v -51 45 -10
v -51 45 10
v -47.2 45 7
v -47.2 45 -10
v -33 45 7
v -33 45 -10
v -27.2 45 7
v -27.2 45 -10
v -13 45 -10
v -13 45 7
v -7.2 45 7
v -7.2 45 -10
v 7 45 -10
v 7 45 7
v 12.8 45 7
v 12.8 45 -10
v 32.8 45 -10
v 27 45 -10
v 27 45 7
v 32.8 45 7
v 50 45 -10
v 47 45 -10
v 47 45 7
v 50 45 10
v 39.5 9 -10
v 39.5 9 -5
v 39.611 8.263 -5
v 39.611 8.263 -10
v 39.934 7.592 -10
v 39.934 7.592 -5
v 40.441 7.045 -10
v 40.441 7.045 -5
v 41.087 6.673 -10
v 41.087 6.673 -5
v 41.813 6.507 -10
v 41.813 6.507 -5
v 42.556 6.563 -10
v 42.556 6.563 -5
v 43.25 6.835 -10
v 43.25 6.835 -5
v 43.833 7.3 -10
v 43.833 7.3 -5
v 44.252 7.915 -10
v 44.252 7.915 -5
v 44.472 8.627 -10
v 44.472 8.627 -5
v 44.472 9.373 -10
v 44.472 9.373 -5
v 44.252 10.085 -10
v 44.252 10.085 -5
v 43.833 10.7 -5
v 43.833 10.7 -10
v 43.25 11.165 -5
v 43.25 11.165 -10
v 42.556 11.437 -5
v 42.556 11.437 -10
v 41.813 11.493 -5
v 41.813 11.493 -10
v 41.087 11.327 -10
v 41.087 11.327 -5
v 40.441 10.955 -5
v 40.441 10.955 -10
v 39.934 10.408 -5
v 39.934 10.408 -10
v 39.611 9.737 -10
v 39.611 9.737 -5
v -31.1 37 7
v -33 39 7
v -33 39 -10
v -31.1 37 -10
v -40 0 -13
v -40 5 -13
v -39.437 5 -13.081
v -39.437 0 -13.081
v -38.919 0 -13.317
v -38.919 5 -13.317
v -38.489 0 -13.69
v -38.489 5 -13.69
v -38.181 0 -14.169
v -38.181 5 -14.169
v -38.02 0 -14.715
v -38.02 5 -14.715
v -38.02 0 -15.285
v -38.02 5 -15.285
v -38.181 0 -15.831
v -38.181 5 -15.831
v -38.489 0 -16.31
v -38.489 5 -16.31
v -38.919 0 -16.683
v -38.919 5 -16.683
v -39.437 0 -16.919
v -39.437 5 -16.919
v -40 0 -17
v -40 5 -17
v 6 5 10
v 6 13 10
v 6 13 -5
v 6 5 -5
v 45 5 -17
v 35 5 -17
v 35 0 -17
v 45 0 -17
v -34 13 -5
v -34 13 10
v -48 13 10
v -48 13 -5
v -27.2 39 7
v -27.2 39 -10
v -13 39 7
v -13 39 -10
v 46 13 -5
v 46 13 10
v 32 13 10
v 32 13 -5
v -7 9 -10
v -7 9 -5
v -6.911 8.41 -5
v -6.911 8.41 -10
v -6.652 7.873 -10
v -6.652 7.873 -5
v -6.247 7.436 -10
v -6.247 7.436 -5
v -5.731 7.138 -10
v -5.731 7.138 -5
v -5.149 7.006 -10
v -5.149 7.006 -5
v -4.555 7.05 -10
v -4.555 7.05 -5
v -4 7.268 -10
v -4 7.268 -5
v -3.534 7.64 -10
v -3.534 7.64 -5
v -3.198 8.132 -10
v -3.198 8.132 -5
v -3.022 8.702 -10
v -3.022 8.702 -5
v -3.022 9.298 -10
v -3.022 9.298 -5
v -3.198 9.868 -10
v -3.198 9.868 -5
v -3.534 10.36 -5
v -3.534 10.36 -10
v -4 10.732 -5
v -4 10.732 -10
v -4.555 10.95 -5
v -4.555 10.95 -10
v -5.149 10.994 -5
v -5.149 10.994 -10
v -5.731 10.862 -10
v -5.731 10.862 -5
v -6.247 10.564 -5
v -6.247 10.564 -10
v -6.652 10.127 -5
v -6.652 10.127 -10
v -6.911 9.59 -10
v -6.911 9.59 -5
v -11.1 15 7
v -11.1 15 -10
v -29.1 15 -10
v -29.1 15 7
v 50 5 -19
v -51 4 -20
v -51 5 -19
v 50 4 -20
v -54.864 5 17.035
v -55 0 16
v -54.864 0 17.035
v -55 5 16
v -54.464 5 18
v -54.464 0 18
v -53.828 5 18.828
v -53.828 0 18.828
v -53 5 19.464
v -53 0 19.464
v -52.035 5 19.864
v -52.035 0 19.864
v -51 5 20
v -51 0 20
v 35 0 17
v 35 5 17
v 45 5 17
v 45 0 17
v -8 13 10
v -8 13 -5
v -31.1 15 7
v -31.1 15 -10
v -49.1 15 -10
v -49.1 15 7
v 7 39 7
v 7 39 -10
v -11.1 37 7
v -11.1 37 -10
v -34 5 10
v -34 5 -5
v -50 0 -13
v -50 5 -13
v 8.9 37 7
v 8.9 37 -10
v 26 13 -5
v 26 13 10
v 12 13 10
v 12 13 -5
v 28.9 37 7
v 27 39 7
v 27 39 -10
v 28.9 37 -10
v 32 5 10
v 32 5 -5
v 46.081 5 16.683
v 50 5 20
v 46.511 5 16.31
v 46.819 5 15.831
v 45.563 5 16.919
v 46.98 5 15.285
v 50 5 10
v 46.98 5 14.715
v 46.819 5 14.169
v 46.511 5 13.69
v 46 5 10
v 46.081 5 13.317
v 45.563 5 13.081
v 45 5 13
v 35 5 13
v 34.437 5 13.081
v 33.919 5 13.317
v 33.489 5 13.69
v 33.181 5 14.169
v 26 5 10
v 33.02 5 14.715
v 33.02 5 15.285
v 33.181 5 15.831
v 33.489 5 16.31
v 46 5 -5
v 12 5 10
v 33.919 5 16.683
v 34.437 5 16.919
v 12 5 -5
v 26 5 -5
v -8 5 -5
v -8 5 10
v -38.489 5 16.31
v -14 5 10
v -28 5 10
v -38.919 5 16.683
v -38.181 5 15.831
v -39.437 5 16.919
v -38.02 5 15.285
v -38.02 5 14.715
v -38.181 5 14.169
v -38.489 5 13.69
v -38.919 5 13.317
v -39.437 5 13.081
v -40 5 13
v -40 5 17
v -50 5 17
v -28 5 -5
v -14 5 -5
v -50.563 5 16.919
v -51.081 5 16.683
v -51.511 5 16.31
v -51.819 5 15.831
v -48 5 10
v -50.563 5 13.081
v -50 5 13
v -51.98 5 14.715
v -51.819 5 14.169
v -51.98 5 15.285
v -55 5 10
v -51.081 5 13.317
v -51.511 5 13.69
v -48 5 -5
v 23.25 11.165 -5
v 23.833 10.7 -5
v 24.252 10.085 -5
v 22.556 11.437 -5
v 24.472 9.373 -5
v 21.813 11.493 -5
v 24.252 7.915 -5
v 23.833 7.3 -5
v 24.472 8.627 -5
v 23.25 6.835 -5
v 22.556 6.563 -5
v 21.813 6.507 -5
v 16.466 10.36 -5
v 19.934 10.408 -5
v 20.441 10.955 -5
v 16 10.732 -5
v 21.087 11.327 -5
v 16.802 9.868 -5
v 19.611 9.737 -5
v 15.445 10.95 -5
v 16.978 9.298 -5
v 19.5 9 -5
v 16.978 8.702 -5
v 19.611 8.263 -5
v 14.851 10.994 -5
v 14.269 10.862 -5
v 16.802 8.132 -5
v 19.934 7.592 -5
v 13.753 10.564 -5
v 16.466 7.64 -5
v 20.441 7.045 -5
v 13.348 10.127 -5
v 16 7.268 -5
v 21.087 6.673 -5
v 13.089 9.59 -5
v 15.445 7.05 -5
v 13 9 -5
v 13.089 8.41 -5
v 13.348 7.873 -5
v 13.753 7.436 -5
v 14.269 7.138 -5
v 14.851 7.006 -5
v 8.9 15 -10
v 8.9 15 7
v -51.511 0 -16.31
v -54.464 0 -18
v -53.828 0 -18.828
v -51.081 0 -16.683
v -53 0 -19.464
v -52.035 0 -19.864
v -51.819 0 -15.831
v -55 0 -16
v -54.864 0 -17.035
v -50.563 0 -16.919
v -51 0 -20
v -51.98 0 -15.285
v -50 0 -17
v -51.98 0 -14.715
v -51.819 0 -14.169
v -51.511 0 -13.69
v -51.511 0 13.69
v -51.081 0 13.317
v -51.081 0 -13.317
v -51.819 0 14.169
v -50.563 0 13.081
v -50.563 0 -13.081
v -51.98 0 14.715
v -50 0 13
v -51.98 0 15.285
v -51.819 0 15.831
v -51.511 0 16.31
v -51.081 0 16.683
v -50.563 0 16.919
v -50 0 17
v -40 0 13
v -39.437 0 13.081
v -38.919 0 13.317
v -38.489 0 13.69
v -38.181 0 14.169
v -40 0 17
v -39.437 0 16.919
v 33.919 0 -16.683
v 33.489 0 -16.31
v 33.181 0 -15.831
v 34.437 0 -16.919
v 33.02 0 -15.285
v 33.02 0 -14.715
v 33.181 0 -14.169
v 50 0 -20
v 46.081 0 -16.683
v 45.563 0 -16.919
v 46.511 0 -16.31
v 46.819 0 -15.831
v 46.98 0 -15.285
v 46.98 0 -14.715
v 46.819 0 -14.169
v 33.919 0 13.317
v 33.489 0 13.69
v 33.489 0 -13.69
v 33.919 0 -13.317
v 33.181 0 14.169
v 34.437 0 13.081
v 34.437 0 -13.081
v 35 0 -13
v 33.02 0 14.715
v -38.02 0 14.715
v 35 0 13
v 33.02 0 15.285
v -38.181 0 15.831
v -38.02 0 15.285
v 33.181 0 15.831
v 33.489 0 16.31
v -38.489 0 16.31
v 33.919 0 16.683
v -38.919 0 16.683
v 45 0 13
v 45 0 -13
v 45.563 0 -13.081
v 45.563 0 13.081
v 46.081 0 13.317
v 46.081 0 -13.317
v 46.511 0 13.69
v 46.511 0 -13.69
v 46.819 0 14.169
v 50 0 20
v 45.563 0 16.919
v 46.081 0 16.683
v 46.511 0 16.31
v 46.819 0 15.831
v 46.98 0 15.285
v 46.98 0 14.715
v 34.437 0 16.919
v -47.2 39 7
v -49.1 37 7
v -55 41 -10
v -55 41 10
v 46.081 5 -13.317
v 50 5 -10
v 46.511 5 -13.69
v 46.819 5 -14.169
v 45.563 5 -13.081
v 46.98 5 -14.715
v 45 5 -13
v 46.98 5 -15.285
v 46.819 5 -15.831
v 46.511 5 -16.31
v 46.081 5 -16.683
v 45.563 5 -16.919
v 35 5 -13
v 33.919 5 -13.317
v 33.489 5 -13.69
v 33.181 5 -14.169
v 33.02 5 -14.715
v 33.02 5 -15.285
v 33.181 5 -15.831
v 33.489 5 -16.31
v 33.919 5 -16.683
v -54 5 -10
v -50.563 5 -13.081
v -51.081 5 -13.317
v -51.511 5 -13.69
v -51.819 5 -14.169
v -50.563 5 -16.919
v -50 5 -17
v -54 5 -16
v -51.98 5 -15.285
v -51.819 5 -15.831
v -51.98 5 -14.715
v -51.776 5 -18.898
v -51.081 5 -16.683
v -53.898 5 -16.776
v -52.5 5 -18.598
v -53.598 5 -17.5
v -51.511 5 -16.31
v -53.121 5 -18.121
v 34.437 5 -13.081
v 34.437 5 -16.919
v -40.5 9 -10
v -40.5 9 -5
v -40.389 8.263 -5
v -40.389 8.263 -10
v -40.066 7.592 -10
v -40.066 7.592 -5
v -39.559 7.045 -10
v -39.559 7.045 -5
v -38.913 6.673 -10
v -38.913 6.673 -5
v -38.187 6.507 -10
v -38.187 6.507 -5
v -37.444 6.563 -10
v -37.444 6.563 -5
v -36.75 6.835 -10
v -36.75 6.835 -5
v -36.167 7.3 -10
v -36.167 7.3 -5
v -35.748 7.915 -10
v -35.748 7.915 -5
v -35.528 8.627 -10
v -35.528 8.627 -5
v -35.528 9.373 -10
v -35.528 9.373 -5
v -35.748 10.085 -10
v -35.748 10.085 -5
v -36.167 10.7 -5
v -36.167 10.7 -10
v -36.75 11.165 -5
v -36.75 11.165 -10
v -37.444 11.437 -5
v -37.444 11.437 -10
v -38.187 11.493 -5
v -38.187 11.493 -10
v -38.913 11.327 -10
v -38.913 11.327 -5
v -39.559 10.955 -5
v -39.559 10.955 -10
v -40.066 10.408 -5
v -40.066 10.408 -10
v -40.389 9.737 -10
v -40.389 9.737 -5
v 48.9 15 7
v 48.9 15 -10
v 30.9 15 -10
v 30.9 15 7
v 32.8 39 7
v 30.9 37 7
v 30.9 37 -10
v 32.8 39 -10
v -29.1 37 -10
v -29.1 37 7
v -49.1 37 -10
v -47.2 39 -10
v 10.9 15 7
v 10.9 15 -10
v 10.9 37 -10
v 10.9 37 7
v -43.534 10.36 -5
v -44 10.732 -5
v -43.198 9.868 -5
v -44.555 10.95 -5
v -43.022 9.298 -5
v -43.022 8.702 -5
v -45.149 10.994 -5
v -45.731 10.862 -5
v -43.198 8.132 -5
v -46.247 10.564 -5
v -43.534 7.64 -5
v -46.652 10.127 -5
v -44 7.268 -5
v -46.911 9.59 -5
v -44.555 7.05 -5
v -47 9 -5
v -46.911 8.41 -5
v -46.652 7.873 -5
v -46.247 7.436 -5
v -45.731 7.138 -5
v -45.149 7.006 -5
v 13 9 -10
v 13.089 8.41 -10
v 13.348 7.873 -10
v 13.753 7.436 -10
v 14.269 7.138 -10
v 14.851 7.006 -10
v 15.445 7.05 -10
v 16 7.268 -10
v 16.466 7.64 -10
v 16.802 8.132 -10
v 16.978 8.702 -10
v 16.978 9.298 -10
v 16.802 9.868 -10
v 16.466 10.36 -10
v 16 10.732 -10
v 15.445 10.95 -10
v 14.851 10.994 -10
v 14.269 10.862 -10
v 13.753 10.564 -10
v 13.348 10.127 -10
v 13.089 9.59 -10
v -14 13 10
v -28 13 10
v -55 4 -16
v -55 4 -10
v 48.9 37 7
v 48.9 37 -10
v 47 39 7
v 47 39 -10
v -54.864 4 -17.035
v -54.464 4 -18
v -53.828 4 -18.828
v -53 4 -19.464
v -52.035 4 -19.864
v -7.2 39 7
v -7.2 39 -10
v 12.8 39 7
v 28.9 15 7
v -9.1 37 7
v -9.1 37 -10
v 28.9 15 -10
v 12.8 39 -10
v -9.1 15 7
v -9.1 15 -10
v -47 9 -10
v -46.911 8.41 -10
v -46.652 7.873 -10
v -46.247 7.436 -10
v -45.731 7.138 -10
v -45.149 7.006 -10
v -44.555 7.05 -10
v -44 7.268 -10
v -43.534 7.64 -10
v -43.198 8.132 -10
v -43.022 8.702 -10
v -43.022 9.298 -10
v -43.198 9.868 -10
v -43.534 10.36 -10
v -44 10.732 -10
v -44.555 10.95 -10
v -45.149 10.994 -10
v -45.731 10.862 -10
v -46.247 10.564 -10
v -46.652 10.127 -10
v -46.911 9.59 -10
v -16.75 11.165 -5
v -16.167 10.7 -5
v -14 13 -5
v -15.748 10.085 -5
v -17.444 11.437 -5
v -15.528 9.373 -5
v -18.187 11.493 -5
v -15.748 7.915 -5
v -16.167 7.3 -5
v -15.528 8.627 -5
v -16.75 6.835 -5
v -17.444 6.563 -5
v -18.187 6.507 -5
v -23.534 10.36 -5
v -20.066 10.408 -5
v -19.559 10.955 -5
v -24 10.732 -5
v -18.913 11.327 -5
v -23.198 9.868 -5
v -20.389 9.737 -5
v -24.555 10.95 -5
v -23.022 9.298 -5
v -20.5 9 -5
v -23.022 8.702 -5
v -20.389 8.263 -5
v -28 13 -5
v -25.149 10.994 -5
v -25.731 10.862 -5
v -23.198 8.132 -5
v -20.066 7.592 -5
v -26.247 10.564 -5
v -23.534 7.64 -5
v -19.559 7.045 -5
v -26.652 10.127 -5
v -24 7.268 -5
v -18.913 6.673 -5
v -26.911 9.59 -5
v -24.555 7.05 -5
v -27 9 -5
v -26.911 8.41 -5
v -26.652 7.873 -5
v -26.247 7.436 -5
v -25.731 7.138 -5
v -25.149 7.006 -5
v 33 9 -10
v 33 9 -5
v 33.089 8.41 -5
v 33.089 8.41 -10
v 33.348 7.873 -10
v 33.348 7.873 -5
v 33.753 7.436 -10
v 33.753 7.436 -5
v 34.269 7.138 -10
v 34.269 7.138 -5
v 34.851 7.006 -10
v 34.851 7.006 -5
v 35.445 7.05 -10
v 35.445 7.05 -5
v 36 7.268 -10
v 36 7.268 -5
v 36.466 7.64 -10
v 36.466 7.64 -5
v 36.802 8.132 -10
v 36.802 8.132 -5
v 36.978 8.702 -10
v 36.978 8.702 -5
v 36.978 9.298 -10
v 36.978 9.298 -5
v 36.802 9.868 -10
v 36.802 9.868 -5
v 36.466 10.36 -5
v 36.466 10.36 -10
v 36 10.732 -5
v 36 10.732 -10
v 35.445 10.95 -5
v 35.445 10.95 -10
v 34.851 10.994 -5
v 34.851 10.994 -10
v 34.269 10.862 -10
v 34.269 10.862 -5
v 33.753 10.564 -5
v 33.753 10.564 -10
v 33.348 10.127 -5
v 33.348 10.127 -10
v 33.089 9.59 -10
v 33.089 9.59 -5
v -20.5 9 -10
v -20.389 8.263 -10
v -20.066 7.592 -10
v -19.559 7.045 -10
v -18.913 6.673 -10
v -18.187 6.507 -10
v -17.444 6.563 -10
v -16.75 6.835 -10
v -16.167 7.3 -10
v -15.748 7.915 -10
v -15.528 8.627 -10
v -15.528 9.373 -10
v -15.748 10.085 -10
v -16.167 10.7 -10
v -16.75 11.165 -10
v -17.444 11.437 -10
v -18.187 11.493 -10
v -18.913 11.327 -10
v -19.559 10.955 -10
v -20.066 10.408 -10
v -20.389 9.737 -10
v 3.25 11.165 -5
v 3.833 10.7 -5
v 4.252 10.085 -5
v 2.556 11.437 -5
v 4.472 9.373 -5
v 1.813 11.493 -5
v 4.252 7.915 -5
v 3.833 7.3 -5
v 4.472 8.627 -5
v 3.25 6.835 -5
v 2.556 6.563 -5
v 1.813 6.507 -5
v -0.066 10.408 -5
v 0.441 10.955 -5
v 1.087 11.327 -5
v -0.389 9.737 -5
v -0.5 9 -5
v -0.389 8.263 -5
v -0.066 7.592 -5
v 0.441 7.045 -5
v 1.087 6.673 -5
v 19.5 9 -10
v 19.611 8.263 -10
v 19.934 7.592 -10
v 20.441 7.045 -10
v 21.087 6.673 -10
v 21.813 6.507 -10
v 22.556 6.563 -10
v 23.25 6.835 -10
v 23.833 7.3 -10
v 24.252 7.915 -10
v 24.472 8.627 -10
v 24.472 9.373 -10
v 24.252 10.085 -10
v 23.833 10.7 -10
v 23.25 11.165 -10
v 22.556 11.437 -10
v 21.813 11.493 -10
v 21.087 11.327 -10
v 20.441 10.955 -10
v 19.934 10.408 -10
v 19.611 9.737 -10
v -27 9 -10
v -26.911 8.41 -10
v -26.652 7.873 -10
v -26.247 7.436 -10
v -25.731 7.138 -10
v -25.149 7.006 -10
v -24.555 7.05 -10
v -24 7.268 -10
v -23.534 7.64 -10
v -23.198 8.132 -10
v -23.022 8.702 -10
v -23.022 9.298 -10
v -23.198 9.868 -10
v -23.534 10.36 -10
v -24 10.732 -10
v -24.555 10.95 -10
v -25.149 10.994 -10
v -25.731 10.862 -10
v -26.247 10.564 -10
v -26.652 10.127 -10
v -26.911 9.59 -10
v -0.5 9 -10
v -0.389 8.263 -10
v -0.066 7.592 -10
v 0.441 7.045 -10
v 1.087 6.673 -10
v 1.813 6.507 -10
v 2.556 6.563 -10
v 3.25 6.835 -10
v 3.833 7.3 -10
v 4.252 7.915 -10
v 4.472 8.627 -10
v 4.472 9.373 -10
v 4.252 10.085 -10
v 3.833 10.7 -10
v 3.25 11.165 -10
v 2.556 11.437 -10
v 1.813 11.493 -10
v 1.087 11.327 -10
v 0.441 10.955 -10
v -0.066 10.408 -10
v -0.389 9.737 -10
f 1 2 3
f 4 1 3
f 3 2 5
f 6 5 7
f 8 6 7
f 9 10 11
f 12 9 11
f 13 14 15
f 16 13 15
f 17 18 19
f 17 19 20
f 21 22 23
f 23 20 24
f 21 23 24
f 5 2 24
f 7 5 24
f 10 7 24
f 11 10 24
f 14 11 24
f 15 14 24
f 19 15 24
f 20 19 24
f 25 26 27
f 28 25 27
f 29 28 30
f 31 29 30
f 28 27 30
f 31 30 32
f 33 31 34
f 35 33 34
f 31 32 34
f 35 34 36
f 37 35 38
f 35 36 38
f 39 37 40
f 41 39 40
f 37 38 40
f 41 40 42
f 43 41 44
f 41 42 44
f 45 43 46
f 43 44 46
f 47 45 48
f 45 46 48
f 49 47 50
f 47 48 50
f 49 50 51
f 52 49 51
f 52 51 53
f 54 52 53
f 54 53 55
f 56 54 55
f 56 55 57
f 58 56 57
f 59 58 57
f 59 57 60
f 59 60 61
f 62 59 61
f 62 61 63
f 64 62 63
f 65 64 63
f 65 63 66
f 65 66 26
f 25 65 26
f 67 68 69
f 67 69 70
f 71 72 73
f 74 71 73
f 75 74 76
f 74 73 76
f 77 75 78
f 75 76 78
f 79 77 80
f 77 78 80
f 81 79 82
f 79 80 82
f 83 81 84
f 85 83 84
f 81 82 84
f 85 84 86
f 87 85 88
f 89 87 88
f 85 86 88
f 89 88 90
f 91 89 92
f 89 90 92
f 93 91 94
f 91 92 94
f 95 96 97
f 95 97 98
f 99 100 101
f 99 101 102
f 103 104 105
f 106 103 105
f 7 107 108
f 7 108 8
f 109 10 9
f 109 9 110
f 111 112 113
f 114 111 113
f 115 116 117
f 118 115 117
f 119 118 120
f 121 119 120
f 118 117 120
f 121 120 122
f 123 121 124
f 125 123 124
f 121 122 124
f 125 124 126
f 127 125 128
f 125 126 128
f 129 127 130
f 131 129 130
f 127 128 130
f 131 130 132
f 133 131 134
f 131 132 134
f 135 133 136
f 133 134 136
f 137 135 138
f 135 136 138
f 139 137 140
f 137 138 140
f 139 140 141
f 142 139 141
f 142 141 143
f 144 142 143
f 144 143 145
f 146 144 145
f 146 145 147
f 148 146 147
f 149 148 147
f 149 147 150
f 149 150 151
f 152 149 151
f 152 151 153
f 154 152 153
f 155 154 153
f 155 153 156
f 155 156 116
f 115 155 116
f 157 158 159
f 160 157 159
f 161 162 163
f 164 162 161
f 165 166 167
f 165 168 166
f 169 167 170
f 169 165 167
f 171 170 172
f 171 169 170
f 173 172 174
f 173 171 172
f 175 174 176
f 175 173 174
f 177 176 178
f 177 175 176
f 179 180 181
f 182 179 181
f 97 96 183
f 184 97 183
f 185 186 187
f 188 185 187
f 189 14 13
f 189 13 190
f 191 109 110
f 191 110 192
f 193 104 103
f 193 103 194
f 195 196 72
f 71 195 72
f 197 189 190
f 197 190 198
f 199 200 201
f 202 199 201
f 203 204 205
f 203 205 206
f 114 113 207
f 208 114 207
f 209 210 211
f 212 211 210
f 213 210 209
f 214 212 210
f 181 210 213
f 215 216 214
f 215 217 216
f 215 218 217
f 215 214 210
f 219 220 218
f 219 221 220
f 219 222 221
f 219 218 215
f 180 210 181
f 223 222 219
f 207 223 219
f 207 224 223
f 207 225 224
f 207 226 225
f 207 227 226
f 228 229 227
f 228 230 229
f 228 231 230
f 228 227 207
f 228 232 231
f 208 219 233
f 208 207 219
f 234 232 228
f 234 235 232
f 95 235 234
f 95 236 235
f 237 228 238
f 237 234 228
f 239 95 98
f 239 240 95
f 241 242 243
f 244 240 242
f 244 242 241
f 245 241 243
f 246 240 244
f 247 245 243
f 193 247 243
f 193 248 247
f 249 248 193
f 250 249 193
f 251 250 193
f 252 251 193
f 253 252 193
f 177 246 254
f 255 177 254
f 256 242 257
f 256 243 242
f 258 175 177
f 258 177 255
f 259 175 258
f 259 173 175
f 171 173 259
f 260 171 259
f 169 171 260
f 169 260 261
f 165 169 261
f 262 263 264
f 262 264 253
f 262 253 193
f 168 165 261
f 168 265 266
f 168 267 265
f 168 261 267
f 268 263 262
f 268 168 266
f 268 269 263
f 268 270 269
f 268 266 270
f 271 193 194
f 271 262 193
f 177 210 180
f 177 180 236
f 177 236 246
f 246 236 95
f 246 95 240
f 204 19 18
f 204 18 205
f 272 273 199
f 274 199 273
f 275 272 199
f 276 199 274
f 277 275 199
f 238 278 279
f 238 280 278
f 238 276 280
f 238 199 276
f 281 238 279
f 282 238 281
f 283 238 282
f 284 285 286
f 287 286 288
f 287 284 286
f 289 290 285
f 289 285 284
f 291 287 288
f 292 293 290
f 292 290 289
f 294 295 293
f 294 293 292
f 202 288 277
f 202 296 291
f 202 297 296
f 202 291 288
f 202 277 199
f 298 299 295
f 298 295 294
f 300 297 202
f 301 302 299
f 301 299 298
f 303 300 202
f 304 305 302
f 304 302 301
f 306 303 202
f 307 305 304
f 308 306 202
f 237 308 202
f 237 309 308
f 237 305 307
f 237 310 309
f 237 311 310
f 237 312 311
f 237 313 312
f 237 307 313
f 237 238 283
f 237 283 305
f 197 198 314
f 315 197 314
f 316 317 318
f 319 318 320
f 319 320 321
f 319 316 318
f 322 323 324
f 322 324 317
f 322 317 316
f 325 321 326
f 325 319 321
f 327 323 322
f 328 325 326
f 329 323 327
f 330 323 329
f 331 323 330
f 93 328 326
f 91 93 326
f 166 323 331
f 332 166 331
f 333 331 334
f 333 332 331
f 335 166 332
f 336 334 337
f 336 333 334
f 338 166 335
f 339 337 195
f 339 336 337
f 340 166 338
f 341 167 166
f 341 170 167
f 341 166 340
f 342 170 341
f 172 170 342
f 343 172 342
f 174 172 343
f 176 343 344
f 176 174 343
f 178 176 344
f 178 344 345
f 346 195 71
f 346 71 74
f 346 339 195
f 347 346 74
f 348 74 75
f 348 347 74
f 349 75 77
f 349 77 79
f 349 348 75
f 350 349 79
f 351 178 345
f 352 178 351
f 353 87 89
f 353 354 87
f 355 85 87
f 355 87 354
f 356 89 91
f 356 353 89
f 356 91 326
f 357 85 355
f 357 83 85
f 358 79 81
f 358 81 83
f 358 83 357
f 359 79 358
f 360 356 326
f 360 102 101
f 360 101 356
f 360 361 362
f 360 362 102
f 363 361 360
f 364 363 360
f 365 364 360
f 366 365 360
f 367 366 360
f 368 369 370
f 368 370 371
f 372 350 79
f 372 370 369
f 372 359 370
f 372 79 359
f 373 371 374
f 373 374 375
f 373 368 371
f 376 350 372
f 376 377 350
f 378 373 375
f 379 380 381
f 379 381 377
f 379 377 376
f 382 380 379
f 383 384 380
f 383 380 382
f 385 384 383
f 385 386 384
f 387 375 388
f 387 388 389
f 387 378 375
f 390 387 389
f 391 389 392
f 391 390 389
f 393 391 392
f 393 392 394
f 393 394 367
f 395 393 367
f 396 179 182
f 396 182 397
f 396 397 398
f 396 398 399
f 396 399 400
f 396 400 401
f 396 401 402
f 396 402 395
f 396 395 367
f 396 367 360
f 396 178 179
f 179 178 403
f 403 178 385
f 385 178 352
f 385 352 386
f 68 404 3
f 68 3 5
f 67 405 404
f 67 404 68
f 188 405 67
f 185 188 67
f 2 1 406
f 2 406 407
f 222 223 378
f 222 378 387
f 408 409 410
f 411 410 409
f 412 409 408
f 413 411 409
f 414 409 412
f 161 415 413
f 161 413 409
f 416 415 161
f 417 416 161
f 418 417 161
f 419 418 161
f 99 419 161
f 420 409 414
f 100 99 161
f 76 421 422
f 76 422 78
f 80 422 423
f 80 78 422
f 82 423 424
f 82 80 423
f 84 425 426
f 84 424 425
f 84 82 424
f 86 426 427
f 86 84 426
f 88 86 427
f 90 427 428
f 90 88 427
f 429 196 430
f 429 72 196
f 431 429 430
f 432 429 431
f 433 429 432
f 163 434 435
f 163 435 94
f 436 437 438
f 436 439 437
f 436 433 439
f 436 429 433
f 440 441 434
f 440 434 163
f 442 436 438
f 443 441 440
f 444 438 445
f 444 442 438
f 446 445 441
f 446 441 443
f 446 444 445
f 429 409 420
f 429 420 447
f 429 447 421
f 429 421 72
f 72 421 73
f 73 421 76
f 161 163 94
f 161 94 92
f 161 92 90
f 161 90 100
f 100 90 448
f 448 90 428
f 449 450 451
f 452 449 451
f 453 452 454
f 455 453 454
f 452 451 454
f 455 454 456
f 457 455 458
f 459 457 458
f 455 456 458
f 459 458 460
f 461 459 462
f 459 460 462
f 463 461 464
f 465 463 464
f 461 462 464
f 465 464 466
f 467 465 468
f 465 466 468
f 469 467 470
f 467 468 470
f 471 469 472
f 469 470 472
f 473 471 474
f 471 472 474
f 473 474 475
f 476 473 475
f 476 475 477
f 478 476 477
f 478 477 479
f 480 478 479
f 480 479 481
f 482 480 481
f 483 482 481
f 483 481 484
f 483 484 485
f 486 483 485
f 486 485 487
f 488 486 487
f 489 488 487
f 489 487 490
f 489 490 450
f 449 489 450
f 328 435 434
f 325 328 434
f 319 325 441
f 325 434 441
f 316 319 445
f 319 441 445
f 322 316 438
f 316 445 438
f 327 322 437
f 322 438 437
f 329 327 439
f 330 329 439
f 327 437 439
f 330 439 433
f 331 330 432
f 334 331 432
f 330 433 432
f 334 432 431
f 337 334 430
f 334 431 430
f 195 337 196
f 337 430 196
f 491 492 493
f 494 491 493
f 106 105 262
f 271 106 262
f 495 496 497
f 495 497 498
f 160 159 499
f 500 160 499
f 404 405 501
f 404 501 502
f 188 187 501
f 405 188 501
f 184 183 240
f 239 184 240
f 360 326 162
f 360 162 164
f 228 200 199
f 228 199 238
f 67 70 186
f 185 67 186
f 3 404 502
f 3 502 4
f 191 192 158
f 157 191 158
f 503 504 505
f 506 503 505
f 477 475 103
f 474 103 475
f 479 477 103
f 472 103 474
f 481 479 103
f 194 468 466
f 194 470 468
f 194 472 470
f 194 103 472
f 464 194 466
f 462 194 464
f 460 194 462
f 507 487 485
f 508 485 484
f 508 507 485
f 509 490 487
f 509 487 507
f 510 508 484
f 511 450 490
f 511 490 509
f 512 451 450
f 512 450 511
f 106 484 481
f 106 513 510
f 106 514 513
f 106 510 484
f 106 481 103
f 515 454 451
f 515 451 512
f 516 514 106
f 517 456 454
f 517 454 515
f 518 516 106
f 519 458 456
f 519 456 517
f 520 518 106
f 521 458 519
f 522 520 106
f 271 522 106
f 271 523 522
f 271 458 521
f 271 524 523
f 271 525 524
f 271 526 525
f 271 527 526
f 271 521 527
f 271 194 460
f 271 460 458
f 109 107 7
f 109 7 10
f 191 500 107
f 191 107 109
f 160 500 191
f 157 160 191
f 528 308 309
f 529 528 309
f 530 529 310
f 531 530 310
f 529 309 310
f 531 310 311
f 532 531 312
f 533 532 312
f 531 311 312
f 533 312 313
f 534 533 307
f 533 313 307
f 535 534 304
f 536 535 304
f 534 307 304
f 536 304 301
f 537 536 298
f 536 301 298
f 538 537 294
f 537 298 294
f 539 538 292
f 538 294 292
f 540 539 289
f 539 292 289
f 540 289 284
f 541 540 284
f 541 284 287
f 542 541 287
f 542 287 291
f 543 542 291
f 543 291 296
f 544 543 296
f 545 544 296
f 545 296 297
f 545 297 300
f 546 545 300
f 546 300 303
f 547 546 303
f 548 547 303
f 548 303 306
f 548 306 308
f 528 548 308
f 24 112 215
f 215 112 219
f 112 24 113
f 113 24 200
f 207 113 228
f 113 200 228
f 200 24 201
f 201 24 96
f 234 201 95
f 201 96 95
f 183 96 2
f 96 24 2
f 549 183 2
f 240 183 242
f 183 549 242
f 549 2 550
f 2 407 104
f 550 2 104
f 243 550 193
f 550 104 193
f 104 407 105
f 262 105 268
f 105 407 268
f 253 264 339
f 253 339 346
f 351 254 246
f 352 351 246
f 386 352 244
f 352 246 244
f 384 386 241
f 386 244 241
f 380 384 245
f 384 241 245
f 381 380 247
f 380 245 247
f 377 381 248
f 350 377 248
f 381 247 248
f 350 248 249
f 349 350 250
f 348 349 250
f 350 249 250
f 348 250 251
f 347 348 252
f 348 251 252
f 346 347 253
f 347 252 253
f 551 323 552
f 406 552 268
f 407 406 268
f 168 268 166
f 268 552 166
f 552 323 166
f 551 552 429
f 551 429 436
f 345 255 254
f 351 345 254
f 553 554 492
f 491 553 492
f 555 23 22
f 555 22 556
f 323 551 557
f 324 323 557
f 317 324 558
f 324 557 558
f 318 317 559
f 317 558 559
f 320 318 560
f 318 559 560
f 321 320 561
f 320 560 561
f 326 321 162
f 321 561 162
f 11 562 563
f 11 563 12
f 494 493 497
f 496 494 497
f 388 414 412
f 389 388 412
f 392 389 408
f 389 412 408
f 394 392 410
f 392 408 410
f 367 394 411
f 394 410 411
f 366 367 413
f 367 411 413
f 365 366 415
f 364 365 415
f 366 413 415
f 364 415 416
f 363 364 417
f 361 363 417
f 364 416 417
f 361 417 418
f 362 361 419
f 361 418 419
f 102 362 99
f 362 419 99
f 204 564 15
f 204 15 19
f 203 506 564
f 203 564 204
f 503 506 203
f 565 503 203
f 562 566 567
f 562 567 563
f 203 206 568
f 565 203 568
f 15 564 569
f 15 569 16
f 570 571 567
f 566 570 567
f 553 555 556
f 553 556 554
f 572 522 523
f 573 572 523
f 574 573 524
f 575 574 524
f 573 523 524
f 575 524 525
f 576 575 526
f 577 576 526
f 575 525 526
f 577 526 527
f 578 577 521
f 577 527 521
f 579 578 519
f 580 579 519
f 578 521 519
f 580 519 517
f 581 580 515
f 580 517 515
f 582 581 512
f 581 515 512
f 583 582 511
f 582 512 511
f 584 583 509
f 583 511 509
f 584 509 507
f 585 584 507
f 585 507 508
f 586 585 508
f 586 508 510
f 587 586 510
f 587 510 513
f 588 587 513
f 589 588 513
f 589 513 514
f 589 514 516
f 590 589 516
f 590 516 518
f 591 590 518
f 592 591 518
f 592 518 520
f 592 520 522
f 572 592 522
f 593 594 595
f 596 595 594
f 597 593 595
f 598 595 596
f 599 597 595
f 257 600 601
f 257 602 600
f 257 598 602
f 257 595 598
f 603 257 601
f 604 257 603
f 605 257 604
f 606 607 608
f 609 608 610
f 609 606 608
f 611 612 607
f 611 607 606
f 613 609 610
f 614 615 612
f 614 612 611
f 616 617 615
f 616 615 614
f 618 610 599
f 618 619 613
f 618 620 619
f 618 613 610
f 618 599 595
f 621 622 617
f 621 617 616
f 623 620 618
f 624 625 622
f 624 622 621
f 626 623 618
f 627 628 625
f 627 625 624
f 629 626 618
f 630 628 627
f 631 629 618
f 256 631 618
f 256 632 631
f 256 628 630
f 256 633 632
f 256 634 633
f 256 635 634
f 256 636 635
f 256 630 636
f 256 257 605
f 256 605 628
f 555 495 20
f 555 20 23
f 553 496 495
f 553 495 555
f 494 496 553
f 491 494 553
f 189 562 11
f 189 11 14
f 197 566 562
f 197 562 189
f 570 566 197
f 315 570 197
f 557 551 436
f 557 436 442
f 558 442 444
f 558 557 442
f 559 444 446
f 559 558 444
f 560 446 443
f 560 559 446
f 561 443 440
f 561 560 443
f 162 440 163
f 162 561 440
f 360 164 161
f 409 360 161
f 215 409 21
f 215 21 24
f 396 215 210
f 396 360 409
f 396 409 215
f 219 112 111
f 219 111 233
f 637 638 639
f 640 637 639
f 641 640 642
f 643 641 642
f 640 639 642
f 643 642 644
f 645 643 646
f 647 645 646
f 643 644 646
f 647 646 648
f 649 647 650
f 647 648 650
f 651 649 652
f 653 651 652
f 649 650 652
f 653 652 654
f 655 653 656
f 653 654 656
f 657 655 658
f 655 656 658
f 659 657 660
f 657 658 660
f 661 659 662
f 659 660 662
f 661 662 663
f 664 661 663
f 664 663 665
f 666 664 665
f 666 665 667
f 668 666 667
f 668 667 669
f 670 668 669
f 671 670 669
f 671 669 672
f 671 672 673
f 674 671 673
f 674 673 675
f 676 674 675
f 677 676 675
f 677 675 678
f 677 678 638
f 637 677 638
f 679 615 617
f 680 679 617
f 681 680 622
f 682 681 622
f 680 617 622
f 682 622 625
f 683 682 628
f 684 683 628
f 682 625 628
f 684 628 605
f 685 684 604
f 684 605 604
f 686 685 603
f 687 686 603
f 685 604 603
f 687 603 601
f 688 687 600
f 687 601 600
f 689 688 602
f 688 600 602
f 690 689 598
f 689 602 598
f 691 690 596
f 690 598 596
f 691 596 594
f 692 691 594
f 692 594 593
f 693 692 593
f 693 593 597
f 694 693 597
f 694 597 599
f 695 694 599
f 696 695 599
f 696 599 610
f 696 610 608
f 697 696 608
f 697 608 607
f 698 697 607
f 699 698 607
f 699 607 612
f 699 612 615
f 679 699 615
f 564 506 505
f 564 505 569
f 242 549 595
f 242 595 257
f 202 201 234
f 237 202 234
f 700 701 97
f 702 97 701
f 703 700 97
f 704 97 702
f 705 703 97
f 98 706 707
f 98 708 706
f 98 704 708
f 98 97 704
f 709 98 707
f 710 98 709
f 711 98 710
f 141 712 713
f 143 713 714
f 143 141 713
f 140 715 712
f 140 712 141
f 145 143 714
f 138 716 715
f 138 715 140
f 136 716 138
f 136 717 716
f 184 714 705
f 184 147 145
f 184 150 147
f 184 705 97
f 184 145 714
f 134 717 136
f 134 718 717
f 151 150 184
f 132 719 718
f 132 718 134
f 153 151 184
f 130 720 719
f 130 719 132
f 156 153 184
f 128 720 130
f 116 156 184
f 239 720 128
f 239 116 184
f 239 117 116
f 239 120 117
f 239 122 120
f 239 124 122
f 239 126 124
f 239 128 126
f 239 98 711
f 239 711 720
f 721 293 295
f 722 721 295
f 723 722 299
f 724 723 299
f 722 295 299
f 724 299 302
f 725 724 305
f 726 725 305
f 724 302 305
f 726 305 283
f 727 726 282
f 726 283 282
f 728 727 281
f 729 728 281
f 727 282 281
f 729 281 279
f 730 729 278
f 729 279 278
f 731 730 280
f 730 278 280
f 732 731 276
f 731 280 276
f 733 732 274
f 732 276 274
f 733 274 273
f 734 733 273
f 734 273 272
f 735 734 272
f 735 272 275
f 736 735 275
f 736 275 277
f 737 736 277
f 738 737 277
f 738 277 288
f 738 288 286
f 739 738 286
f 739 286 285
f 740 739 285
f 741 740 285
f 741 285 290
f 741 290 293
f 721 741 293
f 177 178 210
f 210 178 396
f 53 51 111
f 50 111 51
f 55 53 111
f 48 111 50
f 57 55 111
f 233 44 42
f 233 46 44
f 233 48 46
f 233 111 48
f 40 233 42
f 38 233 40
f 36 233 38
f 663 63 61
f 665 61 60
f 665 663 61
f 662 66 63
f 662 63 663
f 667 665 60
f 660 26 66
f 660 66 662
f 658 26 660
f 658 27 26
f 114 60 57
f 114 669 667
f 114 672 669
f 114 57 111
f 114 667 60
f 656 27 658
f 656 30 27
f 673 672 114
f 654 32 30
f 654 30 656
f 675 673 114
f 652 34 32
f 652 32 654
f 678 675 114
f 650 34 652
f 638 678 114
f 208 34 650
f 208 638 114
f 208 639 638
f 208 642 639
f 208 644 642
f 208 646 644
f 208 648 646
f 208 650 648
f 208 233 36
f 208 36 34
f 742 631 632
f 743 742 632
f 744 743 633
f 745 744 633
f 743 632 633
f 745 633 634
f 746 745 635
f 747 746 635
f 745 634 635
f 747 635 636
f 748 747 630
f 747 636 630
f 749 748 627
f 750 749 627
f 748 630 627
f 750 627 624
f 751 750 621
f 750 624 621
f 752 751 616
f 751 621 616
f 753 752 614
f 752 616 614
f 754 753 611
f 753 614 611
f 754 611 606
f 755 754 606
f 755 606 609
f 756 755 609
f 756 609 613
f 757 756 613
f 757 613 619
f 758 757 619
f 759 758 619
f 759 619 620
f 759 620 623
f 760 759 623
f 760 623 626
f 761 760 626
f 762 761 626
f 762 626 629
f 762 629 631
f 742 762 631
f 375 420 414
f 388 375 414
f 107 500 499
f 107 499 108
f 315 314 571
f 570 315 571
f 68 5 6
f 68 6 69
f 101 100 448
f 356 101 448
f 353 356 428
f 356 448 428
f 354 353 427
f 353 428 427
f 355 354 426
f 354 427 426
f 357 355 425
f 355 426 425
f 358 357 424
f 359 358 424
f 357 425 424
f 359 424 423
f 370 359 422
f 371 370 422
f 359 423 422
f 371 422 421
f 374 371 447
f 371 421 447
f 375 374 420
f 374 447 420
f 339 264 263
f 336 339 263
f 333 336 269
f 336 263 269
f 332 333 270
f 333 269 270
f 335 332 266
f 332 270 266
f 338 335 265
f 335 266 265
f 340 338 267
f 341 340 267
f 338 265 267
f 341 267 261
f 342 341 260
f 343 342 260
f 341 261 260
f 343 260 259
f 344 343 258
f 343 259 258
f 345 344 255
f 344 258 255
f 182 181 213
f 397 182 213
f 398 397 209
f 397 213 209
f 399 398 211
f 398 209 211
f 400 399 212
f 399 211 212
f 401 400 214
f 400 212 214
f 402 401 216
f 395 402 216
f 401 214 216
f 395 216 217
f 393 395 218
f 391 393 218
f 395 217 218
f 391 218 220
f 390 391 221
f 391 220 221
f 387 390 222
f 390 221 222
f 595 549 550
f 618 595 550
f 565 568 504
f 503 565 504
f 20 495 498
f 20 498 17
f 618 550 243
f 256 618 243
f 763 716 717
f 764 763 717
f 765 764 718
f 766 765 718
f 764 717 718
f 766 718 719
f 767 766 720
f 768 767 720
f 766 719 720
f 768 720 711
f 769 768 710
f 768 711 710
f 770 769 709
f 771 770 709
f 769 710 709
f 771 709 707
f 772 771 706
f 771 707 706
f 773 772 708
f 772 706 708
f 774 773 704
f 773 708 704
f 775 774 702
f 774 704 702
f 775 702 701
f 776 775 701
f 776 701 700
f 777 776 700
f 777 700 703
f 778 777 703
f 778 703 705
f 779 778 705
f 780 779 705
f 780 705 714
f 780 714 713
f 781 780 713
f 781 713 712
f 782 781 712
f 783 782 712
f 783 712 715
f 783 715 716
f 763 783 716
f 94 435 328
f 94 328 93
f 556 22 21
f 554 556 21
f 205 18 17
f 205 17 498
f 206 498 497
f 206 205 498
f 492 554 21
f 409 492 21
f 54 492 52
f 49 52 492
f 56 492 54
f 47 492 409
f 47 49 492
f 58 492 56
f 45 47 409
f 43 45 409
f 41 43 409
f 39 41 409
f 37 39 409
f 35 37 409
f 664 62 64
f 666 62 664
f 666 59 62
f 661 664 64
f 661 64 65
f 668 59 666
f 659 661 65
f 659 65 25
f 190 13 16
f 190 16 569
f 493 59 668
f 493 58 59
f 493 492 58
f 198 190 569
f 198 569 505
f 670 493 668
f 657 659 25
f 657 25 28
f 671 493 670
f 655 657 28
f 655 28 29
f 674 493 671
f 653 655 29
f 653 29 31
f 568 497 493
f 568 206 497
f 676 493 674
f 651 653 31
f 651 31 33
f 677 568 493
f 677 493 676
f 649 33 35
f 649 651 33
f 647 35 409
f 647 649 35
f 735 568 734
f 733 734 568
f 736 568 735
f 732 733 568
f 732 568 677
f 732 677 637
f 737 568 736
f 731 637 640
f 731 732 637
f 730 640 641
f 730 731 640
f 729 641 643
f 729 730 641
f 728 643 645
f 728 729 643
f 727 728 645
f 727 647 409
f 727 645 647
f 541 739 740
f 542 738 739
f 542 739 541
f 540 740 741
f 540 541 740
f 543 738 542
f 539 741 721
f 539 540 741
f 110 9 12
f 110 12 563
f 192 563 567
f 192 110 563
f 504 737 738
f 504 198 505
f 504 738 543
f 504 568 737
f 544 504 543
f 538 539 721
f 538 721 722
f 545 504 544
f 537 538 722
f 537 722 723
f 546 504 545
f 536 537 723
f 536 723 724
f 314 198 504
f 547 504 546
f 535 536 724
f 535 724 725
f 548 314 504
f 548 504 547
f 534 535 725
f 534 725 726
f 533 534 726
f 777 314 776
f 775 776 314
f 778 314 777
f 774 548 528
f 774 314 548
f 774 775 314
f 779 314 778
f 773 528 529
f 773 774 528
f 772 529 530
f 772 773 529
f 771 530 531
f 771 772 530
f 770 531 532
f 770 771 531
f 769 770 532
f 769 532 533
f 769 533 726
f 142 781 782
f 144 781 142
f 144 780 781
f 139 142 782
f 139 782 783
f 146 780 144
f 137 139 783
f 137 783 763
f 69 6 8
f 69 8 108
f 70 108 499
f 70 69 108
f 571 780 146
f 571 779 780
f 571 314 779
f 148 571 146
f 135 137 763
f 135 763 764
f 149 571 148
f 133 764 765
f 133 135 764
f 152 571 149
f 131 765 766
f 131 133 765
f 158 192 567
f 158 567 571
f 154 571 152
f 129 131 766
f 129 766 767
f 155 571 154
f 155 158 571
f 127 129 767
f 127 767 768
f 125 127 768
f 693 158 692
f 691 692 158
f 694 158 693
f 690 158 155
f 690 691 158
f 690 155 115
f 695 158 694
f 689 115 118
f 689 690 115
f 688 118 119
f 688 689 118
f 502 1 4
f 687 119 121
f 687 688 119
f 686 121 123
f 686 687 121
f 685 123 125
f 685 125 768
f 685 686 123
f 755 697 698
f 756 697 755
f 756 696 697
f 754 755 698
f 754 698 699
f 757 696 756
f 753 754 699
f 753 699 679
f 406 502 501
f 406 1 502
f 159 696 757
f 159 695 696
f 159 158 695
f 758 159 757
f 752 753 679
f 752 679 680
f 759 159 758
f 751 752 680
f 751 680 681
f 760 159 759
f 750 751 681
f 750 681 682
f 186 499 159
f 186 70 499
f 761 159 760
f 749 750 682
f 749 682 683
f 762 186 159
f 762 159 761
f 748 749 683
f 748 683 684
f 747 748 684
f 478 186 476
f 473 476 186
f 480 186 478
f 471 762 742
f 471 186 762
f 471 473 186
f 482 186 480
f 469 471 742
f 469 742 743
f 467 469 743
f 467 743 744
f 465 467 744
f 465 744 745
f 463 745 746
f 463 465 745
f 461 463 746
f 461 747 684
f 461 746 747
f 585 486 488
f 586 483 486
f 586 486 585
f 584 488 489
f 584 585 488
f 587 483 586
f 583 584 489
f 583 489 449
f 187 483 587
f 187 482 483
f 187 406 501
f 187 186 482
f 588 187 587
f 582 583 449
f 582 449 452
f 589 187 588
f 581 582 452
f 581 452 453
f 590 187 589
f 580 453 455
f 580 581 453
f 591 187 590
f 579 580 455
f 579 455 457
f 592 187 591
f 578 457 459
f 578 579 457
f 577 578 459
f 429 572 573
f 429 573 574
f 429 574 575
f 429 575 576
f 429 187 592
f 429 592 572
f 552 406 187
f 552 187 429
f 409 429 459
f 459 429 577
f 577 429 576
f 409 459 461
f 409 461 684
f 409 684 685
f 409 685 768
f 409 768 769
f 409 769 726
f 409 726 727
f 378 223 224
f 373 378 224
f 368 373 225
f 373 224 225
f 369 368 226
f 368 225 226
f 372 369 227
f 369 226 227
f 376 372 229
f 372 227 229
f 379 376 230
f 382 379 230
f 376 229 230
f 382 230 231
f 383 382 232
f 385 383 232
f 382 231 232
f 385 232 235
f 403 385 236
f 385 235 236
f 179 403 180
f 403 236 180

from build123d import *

# Parameters (mm, degrees)
SKETCH001_W            = 105
SKETCH001_H            = 40
PAD001_DEPTH           = 45
SKETCH002_W            = 10
SKETCH002_H            = 40
POCKET_DEPTH           = 105.001
POCKET001_DEPTH        = 5.001
POCKET002_DEPTH        = 17
LINEARPATTERN_COUNT    = 5
LINEARPATTERN_PITCH    = 20
SKETCH005_W            = 14
SKETCH005_H            = 8
POCKET003_DEPTH        = 15
LINEARPATTERN001_COUNT = 5
LINEARPATTERN001_PITCH = 20
SKETCH006_R            = 2.5
SKETCH006_R_2          = 2
POCKET004_DEPTH        = 15.001
LINEARPATTERN002_COUNT = 5
LINEARPATTERN002_PITCH = 20
FILLET_R               = 4
CHAMFER_SIZE           = 1
CHAMFER001_SIZE        = 4


with BuildPart() as part:
    # Sketch001 → Pad001 (new body)
    with BuildSketch(Plane.XZ):
        with Locations((-2.5, 0)):
            Rectangle(SKETCH001_W, SKETCH001_H)
    extrude(amount=-PAD001_DEPTH)

    # Sketch002 (on Face4 of Pad001) → Pocket (cut, through all)
    with BuildSketch(Plane(origin=(-55, 0, 0), x_dir=(0, 0, -1), z_dir=(-1, 0, 0))):
        with Locations((-15, -25)):
            Rectangle(SKETCH002_W, SKETCH002_H)
        with Locations((15, -25)):
            Rectangle(SKETCH002_W, SKETCH002_H)
    extrude(amount=-POCKET_DEPTH, mode=Mode.SUBTRACT)

    # Sketch003 (on Face7 of Pocket) → Pocket001 (cut, through all)
    with BuildSketch(Plane(origin=(0, 5, 0), x_dir=(1, 0, 0), z_dir=(0, 1, 0))):
        with BuildLine():
            ThreePointArc((-50, 17), (-52, 15), (-50, 13))
            Line((-50, 13), (-40, 13))
            ThreePointArc((-40, 13), (-38, 15), (-40, 17))
            Line((-50, 17), (-40, 17))
        make_face()
        with BuildLine():
            ThreePointArc((35, 17), (33, 15), (35, 13))
            Line((35, 13), (45, 13))
            ThreePointArc((45, 13), (47, 15), (45, 17))
            Line((35, 17), (45, 17))
        make_face()
        with BuildLine():
            ThreePointArc((-50, -13), (-52, -15), (-50, -17))
            Line((-50, -17), (-40, -17))
            ThreePointArc((-40, -17), (-38, -15), (-40, -13))
            Line((-50, -13), (-40, -13))
        make_face()
        with BuildLine():
            ThreePointArc((35, -13), (33, -15), (35, -17))
            Line((35, -17), (45, -17))
            ThreePointArc((45, -17), (47, -15), (45, -13))
            Line((35, -13), (45, -13))
        make_face()
    extrude(amount=-POCKET001_DEPTH, mode=Mode.SUBTRACT)

    # Sketch004 (on Face24 of Pocket001) → Pocket002 (cut)
    with BuildSketch(Plane(origin=(0, 0, -10), x_dir=(1, 0, 0), z_dir=(0, 0, -1))):
        Polygon((47, -45), (47, -39), (48.9, -37), (48.9, -15), (30.9, -15), (30.9, -37), (32.8, -39), (32.8, -45), align=None)
    pocket002 = extrude(amount=-POCKET002_DEPTH, mode=Mode.SUBTRACT)

    # LinearPattern: Pocket002 ×5
    with Locations(*[(-i * LINEARPATTERN_PITCH, 0, 0) for i in range(1, LINEARPATTERN_COUNT)]):
        add(pocket002, mode=Mode.SUBTRACT)

    # Sketch005 (on Face26 of LinearPattern) → Pocket003 (cut)
    with BuildSketch(Plane(origin=(0, 0, 10), x_dir=(-1, 0, 0), z_dir=(0, 0, 1))):
        with Locations((-39, -9)):
            Rectangle(SKETCH005_W, SKETCH005_H)
    pocket003 = extrude(amount=-POCKET003_DEPTH, mode=Mode.SUBTRACT)

    # LinearPattern001: Pocket003 ×5
    with Locations(*[(-i * LINEARPATTERN001_PITCH, 0, 0) for i in range(1, LINEARPATTERN001_COUNT)]):
        add(pocket003, mode=Mode.SUBTRACT)

    # Sketch006 (on Face27 of LinearPattern001) → Pocket004 (cut, through all)
    with BuildSketch(Plane(origin=(0, 0, -5), x_dir=(-1, 0, 0), z_dir=(0, 0, 1))):
        with Locations((-42, -9)):
            Circle(SKETCH006_R)
        with Locations((-35, -9)):
            Circle(SKETCH006_R_2)
    pocket004 = extrude(amount=-POCKET004_DEPTH, mode=Mode.SUBTRACT)

    # LinearPattern002: Pocket004 ×5
    with Locations(*[(-i * LINEARPATTERN002_PITCH, 0, 0) for i in range(1, LINEARPATTERN002_COUNT)]):
        add(pocket004, mode=Mode.SUBTRACT)

    # Fillet
    fillet_edges = [part.edges().sort_by_distance(p)[0] for p in [
        (-55, 2.5, -20),
        (-55, 2.5, 20),
    ]]
    fillet(fillet_edges, radius=FILLET_R)

    # Chamfer
    chamfer_edges = [part.edges().sort_by_distance(p)[0] for p in [
        (-0.5, 5, -20),
    ]]
    chamfer(chamfer_edges, length=CHAMFER_SIZE)

    # Chamfer001
    chamfer001_edges = [part.edges().sort_by_distance(p)[0] for p in [
        (-55, 45, 0),
    ]]
    chamfer(chamfer001_edges, length=CHAMFER001_SIZE)


solid = part.part
